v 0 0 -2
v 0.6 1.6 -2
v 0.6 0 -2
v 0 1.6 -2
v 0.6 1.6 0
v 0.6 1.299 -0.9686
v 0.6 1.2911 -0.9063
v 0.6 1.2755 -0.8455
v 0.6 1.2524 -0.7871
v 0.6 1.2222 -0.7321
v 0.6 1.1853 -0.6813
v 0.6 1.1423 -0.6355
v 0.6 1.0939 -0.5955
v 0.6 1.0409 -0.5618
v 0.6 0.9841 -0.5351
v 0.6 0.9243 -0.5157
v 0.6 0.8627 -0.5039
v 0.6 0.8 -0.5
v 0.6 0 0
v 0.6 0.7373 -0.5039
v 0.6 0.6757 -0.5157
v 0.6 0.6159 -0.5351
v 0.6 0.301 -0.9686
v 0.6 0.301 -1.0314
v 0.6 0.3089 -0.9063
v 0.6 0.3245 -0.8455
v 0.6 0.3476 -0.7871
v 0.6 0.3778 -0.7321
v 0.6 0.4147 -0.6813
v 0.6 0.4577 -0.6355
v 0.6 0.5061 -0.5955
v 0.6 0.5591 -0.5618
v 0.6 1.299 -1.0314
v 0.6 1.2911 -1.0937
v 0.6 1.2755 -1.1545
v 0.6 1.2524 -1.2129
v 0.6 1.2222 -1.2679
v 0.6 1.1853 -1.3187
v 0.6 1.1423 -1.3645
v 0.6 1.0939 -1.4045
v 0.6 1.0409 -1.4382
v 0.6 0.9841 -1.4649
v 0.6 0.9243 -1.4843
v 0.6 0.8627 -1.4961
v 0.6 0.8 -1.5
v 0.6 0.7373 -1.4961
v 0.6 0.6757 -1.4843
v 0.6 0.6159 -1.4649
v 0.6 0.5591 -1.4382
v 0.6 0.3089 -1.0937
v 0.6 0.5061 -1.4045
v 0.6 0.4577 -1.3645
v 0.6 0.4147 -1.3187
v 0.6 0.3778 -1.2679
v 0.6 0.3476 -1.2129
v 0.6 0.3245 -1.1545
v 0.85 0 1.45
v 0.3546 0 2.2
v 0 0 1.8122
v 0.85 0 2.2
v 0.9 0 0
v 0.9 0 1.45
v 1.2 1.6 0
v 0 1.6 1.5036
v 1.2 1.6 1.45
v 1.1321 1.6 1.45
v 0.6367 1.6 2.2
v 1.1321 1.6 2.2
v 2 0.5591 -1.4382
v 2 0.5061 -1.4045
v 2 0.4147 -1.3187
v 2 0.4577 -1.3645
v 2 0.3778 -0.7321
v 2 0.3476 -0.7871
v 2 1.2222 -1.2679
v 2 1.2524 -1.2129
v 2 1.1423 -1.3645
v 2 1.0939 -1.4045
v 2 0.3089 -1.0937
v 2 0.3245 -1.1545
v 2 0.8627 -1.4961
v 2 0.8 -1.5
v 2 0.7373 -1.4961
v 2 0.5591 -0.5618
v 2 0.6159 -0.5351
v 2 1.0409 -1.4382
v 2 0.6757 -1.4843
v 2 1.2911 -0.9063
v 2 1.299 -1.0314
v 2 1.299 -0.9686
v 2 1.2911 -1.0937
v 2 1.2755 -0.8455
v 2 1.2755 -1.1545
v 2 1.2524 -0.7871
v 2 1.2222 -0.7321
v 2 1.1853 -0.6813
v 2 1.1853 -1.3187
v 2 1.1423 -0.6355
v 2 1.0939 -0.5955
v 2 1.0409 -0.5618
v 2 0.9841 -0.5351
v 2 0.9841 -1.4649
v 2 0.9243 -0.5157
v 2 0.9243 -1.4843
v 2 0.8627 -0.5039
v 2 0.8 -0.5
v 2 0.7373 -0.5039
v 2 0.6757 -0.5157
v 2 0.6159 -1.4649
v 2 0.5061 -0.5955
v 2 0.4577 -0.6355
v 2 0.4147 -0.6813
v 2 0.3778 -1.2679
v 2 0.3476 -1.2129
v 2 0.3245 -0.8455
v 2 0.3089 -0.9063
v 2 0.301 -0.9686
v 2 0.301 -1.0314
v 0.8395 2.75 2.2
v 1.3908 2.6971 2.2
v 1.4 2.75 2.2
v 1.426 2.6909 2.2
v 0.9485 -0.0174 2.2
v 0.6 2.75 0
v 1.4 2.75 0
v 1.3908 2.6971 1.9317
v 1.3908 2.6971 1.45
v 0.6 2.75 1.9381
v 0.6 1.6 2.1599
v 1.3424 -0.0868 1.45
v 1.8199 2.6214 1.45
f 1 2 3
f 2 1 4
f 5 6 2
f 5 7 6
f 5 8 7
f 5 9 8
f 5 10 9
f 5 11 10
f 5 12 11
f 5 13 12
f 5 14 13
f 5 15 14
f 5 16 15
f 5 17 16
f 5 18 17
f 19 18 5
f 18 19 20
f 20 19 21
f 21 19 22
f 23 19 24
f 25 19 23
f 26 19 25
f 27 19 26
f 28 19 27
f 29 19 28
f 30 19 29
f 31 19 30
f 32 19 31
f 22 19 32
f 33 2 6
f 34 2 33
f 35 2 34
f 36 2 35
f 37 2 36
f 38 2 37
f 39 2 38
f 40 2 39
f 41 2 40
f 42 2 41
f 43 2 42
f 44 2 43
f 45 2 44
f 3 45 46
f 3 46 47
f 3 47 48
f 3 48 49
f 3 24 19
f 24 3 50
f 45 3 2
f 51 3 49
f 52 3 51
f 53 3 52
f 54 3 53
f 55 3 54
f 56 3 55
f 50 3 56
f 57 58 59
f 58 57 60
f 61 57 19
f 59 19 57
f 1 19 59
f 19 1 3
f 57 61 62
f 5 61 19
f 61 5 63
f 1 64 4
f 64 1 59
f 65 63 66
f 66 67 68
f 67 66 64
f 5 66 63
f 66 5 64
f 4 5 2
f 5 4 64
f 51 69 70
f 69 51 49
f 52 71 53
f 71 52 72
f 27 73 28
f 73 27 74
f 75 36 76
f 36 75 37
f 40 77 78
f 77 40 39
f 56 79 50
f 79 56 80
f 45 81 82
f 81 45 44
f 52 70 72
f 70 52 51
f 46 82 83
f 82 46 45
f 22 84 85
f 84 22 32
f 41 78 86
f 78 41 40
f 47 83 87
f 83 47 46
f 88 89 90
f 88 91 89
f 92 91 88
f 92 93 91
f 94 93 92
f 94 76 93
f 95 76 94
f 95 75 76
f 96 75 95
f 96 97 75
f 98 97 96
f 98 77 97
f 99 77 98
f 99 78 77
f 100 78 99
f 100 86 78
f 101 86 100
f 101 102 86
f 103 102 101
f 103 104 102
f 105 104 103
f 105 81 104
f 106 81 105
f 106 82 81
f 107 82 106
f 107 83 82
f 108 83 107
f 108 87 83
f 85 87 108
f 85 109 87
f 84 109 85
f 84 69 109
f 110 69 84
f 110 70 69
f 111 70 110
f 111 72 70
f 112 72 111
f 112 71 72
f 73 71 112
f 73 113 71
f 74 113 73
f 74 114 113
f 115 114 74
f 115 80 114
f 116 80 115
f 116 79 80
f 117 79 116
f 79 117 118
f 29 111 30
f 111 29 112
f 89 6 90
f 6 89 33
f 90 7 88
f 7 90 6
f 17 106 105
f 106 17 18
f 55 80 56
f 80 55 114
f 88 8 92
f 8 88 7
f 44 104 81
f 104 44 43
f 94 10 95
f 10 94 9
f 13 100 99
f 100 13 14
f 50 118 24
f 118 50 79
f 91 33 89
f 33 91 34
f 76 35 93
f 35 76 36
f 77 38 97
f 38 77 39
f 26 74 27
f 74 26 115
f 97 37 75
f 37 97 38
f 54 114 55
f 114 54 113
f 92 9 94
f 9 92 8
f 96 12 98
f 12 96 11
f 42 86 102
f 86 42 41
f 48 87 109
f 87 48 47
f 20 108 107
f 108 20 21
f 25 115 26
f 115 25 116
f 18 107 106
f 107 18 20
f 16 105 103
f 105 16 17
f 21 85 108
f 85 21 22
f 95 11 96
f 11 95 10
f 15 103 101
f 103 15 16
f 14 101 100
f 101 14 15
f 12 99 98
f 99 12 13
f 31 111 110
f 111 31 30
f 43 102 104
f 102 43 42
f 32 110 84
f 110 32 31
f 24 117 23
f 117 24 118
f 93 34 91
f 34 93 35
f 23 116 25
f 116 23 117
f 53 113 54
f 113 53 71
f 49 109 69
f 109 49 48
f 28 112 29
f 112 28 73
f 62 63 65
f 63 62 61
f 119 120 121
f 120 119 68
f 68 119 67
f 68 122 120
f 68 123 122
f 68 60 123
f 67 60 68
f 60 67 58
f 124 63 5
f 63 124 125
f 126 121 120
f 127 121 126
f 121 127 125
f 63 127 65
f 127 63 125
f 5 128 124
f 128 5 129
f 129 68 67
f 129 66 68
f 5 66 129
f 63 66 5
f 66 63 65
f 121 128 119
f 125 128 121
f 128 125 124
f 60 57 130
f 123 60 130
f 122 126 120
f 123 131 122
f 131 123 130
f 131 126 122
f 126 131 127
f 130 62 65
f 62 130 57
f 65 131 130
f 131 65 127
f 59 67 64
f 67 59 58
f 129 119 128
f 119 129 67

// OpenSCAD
LIP_WIDTH = 2.75;
LIP_TOP_THICKNESS = 0.1;
LIP_BOT_THICKNESS = 0.5;
LIP_LENGTH = 0.75;
LIP_ANGLE = 10;

FAT_WIDTH = 1.6;
FAT_THICKNESS_FROM = 0.9;
FAT_THICKNESS_TO = 1.2;
FAT_LENGTH = 2.2;

THIN_WIDTH = LIP_WIDTH - FAT_WIDTH;
THIN_THICKNESS_FROM = 0.6;
THIN_THICKNESS_TO = 0.8;
THIN_LENGTH = FAT_LENGTH;

CHAMFER_ANGLE = 42;
ANCHOR_THICKNESS = 0.6;
ANCHOR_LENGTH = 2;
ANCHOR_DIA = 1;

$fn = 50;

module part(width, thickness_from, thickness_to, length) {
    // a-----b
    // |      \
    // |       \
    // d--------c
    linear_extrude(height = length)
    polygon(points = [
        [0, 0], // a
        [thickness_from, 0], // b
        [thickness_to, width], // c
        [0, width] // d
    ]);
}

difference() {
    union() {
        part(FAT_WIDTH, FAT_THICKNESS_FROM, FAT_THICKNESS_TO, FAT_LENGTH);
        translate([FAT_THICKNESS_TO - THIN_THICKNESS_FROM, FAT_WIDTH, 0])
        part(THIN_WIDTH, THIN_THICKNESS_FROM, THIN_THICKNESS_TO, THIN_LENGTH);
        
        translate([FAT_THICKNESS_FROM - LIP_TOP_THICKNESS/2, 0, FAT_LENGTH])
        rotate([-90, 0, -LIP_ANGLE])
        part(LIP_LENGTH, LIP_TOP_THICKNESS, LIP_BOT_THICKNESS, LIP_WIDTH);
        
        translate([0, 0, -ANCHOR_LENGTH])
        union() {
            part(FAT_WIDTH, ANCHOR_THICKNESS, ANCHOR_THICKNESS, ANCHOR_LENGTH);
            
            translate([0, FAT_WIDTH/2, ANCHOR_LENGTH/2])
            rotate([0, 90, 0])
            cylinder(d = ANCHOR_DIA, h = ANCHOR_LENGTH);
        } 
    }
    
    translate([-LIP_WIDTH, 0, 0])
    rotate([0, CHAMFER_ANGLE, -LIP_ANGLE])
    cube(size = [FAT_WIDTH, LIP_WIDTH * 3, FAT_LENGTH * 5], center = true);
}
